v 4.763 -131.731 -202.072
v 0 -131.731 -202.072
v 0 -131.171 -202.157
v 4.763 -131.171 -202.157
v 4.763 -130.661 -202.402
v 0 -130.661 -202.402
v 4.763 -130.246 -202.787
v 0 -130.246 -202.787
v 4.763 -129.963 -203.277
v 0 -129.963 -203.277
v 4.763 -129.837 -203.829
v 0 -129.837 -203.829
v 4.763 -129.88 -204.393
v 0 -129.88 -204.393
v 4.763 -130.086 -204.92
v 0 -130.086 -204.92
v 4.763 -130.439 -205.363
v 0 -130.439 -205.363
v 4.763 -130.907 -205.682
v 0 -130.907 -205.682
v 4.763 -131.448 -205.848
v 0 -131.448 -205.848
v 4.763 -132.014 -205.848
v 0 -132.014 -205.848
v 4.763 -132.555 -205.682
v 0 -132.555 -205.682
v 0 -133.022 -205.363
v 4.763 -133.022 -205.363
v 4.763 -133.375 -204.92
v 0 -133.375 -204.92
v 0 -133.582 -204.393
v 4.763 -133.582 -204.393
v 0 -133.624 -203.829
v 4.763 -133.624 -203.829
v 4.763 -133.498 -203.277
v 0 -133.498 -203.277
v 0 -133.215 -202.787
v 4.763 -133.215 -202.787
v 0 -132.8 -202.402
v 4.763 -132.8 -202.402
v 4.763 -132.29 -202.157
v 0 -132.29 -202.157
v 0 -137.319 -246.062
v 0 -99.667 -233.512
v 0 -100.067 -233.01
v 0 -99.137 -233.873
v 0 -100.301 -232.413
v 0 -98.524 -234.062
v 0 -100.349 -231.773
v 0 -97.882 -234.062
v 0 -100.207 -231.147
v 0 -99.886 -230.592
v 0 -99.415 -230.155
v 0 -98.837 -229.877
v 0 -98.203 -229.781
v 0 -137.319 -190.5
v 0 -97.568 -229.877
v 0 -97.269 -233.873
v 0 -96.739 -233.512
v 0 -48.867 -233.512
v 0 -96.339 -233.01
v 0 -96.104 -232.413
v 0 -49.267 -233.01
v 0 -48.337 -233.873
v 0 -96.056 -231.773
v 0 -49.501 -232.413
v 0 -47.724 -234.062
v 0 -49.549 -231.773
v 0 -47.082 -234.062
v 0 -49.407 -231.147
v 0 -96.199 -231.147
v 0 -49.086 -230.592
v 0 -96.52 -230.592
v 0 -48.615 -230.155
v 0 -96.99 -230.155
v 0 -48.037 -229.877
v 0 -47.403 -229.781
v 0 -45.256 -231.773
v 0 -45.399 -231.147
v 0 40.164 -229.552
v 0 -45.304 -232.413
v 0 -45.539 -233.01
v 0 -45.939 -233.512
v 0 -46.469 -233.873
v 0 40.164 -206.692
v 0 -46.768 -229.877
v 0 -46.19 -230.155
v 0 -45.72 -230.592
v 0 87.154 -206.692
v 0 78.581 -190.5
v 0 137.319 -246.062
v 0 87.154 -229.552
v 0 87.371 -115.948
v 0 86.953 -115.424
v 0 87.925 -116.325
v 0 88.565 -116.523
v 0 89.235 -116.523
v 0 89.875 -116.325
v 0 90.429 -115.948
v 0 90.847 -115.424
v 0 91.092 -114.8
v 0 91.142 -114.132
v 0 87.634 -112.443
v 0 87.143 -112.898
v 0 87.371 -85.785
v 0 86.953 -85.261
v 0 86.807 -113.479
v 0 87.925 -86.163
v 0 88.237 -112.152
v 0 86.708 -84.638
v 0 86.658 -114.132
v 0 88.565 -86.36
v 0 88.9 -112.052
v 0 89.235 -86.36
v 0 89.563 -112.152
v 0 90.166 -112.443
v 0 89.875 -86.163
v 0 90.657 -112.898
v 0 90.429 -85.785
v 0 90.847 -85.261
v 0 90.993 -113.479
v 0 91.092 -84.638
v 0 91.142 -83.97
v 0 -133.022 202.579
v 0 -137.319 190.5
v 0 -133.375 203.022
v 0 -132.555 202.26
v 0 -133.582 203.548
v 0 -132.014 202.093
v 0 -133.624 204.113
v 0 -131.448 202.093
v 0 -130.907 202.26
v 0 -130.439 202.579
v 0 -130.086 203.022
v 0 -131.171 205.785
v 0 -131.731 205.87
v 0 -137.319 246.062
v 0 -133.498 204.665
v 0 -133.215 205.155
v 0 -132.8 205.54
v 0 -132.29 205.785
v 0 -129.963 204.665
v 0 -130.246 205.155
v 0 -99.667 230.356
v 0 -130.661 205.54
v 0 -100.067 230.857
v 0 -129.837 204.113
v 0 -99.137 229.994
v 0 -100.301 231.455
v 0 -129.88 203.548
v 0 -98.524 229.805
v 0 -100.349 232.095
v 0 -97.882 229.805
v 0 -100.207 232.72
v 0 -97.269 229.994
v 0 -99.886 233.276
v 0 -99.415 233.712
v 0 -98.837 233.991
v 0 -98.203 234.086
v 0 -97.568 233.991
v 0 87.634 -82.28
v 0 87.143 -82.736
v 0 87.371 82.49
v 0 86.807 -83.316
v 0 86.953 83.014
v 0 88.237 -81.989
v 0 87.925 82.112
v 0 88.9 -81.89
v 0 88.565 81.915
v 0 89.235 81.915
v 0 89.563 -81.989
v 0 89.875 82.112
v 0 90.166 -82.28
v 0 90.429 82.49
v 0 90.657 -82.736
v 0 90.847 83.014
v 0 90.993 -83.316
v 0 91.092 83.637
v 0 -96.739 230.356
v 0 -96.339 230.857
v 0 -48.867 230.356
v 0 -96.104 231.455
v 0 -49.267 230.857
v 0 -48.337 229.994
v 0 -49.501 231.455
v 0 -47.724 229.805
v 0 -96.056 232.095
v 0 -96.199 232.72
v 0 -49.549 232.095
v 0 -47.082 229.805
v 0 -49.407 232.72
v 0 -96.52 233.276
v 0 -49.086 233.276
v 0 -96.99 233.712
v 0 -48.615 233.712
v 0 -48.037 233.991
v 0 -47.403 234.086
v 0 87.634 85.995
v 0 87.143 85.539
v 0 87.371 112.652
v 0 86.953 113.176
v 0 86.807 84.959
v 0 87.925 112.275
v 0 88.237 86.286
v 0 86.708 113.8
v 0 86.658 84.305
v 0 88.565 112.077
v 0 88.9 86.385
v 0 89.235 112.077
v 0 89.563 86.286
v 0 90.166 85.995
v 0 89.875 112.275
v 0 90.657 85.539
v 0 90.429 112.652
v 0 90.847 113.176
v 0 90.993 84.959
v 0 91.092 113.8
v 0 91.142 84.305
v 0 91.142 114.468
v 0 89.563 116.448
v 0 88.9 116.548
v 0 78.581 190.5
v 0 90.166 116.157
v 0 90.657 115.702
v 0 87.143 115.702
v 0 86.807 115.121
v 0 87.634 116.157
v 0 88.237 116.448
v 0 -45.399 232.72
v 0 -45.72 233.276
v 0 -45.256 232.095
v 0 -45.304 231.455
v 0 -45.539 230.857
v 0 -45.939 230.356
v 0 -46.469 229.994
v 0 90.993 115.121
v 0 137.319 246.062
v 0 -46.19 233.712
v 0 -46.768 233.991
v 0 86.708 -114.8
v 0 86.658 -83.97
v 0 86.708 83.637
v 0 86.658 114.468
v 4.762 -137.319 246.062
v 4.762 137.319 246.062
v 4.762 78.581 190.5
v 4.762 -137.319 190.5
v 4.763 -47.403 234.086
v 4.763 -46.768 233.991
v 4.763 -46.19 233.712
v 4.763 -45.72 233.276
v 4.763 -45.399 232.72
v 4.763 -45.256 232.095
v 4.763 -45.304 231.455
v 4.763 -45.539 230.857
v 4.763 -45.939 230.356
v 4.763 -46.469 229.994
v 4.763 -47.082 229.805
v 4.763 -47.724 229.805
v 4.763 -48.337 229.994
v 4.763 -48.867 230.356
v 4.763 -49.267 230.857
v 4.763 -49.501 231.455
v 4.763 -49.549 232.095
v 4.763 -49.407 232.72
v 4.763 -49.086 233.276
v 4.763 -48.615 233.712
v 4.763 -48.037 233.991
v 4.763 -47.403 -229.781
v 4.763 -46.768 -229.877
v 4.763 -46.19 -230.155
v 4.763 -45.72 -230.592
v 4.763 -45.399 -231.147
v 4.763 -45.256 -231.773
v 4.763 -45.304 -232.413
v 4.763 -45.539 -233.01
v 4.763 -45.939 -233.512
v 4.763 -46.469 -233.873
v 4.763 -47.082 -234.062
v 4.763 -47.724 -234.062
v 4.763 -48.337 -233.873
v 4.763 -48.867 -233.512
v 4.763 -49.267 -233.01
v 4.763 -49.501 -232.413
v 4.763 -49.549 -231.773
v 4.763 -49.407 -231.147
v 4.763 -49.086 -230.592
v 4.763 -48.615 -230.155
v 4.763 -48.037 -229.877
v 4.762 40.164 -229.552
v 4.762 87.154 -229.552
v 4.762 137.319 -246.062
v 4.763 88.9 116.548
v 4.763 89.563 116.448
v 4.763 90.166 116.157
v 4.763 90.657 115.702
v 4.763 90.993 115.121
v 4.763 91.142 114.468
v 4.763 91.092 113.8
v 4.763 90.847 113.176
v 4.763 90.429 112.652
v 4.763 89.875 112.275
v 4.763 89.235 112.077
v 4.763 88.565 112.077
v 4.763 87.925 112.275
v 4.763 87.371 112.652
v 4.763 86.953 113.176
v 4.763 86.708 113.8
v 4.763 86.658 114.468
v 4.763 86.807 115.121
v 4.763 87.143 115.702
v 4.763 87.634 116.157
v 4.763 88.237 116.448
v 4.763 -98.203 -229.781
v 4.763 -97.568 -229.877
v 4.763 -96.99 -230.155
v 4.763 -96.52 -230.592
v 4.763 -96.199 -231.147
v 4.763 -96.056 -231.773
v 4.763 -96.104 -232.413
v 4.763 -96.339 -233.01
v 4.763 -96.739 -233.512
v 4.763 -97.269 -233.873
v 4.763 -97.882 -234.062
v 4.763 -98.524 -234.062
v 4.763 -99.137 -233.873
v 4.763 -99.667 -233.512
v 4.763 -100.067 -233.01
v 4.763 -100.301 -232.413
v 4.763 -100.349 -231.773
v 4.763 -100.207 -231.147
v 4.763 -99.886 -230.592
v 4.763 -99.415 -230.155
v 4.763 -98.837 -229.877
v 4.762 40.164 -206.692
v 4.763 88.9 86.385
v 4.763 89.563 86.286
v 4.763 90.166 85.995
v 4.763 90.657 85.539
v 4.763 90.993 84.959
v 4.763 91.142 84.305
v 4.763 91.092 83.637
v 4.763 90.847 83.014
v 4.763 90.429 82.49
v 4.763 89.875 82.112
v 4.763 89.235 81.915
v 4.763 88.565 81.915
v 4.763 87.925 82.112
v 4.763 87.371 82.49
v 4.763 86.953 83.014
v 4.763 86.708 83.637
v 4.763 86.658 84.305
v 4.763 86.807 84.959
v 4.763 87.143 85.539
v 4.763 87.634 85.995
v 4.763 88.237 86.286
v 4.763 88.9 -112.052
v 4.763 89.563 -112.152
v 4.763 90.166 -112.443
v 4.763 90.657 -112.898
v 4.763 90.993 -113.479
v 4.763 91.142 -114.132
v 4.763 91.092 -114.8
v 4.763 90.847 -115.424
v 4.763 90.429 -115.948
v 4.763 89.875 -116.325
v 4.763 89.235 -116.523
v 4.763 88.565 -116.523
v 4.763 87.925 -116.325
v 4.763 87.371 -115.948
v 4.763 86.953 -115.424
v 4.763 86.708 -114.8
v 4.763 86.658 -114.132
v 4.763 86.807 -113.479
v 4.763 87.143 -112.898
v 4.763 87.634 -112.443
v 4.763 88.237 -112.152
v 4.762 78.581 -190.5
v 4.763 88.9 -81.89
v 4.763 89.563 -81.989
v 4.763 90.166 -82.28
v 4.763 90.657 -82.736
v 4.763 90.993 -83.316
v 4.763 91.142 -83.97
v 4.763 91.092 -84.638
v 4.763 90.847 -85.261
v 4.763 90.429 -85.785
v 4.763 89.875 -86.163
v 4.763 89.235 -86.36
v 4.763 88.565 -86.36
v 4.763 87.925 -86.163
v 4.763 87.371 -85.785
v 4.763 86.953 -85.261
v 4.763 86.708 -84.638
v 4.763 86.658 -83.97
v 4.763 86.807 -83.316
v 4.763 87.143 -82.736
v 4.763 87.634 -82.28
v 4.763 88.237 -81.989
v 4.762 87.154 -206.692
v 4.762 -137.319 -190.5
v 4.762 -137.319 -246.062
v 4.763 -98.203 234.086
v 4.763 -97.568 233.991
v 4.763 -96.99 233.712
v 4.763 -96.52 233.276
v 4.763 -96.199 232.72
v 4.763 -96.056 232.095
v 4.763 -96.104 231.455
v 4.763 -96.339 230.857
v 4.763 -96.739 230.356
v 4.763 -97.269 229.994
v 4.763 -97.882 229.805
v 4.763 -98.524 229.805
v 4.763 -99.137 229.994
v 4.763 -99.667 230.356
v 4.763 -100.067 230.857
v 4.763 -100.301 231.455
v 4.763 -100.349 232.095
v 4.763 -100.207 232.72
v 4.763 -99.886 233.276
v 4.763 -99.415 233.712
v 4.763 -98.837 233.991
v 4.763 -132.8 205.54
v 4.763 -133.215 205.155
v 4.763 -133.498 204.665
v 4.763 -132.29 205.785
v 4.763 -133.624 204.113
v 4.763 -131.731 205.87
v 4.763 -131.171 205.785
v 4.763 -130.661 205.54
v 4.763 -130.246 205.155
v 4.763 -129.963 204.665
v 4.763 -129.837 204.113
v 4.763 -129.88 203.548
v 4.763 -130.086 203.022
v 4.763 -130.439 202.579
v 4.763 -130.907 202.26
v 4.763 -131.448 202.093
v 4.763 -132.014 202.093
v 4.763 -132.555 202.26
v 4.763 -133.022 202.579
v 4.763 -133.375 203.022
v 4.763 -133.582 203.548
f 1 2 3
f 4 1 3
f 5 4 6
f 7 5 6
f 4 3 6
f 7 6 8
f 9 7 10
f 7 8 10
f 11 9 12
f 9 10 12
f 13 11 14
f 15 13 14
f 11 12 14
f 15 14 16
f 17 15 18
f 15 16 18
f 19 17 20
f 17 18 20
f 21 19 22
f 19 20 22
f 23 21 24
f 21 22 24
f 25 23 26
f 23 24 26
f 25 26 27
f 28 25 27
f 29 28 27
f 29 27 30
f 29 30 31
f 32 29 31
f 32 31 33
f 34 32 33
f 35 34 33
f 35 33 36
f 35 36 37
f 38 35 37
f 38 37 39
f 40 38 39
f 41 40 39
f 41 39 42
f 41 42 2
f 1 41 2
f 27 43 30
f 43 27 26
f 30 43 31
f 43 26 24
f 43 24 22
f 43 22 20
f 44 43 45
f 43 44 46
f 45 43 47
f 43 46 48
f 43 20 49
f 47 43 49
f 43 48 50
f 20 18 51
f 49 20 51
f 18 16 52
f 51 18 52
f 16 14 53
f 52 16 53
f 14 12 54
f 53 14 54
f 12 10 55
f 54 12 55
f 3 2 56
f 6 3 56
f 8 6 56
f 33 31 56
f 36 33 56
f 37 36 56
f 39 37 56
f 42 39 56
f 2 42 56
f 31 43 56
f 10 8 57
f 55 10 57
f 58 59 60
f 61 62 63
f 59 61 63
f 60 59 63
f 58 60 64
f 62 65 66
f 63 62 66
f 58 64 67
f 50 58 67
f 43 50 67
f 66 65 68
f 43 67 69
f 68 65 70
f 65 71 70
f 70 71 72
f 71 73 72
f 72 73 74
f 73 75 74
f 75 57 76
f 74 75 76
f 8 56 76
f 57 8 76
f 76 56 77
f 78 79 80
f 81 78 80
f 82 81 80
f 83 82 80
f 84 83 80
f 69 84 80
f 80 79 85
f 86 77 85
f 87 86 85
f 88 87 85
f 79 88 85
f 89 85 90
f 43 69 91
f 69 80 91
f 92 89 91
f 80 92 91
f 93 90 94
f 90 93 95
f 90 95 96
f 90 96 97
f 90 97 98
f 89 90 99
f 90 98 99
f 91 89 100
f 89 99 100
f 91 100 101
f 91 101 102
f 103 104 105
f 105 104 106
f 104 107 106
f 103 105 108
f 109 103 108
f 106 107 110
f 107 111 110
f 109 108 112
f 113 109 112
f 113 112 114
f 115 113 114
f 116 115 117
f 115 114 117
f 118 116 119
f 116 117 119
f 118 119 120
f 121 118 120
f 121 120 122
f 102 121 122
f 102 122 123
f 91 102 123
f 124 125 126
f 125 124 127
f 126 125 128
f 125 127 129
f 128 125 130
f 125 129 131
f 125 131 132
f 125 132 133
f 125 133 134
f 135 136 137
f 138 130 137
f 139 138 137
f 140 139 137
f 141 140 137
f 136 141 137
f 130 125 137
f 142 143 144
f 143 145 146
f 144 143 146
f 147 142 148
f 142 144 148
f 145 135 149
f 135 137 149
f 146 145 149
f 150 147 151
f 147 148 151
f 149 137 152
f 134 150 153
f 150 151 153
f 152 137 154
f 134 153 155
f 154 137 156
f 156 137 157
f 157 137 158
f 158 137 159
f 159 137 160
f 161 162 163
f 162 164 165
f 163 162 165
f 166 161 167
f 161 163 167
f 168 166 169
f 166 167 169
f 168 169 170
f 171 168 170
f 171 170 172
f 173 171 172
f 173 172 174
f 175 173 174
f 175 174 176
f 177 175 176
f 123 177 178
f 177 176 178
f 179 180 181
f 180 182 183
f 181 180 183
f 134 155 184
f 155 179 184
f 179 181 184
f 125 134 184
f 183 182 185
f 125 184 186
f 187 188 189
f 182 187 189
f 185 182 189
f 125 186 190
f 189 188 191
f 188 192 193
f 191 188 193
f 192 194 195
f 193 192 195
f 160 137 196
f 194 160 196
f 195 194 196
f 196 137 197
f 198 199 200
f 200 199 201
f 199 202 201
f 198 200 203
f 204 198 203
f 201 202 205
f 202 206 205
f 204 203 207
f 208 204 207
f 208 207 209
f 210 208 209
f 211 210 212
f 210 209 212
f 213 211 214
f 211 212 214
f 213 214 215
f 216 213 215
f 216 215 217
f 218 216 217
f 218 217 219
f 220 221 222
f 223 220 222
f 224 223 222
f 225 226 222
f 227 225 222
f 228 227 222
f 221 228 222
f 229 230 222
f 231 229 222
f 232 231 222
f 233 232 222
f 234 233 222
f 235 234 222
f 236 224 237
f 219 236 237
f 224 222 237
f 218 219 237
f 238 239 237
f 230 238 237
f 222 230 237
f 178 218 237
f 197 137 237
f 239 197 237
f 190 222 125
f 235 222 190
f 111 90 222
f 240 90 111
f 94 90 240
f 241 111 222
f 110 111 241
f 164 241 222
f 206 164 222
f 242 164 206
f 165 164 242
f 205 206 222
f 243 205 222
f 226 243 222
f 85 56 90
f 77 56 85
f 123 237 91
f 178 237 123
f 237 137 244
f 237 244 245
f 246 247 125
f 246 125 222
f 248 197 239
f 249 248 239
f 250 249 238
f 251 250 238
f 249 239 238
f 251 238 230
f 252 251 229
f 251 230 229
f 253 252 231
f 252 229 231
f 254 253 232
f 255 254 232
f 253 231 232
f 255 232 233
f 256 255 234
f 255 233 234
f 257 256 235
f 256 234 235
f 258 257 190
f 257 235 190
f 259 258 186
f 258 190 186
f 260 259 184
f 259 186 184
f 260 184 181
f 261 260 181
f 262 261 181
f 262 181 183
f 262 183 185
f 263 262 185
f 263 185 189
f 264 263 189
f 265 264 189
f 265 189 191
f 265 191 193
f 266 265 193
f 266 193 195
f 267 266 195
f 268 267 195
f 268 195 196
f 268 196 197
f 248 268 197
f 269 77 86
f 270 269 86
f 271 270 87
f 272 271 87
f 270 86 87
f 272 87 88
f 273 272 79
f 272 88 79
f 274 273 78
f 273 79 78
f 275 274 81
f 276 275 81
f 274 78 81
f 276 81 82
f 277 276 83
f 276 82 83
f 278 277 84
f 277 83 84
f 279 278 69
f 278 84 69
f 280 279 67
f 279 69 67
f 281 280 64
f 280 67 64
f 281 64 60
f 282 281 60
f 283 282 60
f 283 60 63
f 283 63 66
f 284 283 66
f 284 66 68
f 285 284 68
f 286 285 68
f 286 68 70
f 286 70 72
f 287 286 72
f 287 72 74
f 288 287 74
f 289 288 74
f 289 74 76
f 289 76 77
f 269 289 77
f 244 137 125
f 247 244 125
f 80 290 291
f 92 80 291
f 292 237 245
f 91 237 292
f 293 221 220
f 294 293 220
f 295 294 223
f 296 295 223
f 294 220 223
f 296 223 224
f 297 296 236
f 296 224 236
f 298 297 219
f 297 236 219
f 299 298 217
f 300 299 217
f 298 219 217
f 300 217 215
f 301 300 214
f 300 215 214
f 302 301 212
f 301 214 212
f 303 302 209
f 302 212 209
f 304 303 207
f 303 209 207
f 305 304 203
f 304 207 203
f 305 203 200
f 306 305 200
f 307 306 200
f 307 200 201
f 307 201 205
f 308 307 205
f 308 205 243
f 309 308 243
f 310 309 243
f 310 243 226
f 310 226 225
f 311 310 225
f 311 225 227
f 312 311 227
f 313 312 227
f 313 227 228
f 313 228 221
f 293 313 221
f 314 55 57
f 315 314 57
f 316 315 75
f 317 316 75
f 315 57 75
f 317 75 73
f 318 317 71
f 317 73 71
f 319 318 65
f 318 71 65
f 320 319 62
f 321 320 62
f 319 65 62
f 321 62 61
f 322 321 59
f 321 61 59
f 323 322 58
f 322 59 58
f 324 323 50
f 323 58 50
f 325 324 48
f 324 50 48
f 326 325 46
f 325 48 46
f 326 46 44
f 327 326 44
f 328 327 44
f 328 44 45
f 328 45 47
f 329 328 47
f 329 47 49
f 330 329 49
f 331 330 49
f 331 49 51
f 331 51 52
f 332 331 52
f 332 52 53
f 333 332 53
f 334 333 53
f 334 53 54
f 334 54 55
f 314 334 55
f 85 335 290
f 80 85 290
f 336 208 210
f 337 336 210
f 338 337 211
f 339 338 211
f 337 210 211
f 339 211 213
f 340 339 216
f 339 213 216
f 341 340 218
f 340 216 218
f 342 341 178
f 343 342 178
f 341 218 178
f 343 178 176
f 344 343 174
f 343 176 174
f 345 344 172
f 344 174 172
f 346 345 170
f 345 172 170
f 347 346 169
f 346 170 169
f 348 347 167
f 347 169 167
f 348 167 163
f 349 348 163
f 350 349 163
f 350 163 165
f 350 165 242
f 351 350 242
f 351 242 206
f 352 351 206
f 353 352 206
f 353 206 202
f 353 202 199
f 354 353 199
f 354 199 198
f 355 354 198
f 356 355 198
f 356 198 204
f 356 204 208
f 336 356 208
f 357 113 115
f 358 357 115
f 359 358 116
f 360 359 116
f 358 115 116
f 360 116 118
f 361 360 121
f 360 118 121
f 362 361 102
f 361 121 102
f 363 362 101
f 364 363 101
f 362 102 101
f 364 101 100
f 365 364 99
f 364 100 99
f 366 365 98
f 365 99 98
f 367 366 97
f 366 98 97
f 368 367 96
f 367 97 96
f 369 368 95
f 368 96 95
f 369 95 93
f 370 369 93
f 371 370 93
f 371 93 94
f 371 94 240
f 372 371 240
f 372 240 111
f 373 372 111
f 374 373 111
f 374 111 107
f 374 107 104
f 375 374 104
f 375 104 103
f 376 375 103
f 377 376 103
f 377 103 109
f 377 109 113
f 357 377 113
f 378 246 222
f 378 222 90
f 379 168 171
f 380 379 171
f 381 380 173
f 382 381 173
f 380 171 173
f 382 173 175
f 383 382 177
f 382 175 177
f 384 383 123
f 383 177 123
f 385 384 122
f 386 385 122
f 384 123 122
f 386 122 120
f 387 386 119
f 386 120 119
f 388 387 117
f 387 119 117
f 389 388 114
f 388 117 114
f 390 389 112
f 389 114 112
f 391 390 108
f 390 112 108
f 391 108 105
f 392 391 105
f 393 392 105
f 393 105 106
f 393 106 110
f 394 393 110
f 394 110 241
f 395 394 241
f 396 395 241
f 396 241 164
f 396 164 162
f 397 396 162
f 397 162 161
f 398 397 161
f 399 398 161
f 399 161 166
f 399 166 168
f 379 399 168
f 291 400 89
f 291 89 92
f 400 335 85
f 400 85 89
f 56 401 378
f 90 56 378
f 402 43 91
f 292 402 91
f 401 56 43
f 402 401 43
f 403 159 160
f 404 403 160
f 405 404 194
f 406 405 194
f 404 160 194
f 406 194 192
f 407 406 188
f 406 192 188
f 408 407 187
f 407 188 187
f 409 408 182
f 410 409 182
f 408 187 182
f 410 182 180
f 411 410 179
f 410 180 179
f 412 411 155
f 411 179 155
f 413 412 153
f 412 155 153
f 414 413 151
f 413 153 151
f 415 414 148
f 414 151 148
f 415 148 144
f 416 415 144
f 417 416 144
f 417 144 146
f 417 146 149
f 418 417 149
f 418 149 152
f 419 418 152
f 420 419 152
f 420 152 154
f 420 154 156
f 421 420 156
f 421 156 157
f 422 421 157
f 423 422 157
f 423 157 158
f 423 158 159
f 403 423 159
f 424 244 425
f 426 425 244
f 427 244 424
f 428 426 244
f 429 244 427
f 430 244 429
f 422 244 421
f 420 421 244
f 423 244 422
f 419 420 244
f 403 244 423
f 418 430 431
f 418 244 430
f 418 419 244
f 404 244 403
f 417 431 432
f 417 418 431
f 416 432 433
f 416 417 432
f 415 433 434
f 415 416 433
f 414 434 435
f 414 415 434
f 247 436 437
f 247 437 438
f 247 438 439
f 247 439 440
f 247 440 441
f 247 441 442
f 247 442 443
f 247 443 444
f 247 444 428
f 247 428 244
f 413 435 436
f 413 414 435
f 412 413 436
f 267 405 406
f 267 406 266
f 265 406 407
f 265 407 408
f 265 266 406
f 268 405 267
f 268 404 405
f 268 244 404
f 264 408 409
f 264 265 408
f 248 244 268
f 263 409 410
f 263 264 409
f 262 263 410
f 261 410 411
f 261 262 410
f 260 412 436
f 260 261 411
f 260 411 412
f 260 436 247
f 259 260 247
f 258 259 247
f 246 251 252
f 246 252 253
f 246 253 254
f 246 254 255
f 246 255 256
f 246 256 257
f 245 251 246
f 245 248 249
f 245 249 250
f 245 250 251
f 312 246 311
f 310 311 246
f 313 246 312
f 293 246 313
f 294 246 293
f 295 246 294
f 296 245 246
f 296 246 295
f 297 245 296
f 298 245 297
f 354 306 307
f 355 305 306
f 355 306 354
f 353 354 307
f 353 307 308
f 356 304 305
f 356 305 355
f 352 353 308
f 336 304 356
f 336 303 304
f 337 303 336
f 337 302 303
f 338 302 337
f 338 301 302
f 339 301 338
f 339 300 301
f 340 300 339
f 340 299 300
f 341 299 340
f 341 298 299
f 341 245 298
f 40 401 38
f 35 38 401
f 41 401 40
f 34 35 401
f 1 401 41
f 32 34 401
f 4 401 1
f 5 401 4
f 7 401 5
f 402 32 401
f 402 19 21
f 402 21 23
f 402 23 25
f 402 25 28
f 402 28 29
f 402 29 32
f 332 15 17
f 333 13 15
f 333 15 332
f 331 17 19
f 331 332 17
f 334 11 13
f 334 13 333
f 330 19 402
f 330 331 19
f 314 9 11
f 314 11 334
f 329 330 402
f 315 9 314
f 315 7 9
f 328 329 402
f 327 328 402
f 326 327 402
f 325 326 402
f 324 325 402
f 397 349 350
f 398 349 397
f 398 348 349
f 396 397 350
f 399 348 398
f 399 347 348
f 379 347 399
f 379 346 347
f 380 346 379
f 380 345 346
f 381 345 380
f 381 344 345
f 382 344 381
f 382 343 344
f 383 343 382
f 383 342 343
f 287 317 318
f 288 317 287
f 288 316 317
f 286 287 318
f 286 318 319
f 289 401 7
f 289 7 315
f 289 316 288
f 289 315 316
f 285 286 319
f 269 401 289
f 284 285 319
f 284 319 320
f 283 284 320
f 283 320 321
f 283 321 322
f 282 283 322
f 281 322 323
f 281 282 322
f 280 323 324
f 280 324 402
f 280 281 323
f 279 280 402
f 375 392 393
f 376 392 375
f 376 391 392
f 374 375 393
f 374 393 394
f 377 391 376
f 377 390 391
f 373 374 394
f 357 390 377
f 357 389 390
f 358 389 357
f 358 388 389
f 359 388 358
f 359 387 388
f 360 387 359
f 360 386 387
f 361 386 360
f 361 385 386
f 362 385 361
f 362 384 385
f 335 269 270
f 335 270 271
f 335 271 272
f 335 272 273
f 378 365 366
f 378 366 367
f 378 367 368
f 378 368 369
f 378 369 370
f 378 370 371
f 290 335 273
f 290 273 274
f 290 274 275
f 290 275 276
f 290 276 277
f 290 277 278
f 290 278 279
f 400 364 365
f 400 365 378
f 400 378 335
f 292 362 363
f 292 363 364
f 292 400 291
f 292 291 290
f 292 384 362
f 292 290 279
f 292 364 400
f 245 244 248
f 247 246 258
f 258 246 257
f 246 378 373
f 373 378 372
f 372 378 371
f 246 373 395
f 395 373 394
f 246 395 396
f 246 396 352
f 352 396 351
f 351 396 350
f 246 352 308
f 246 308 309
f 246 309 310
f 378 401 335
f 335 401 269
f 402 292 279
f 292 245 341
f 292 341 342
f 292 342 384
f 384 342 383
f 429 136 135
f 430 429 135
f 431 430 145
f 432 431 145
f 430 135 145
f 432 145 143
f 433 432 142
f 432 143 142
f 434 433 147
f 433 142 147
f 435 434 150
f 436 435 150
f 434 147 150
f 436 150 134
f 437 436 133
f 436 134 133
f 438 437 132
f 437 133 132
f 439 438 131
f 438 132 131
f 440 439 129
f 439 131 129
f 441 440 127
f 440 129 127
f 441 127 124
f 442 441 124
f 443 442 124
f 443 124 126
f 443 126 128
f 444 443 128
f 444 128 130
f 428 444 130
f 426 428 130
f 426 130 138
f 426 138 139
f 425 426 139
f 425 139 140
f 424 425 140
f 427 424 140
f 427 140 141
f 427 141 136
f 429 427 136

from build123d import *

# Parameters (mm, degrees)
SKETCH1_W                 = 492.125
SKETCH1_H                 = 274.6375
BOSS_EXTRUDE1_DEPTH       = 4.7625
CUT_EXTRUDE1_REACH        = 6.763
BOSS_EXTRUDE2_REACH       = 494.125
SKETCH3_W                 = 4.7625
SKETCH3_H                 = 274.6375
F_8_CLEARANCE_HOLE1_D     = 4.3053
F_8_CLEARANCE_HOLE1_DEPTH = 74.422
F_8_CLEARANCE_HOLE1_TIP   = 1.293442612
SKETCH9_W                 = 381
SKETCH9_H                 = 215.9
CUT_EXTRUDE2_DEPTH        = 5.7625
F_8_CLEARANCE_HOLE2_D     = 4.4958
F_8_CLEARANCE_HOLE2_DEPTH = 74.422
F_8_CLEARANCE_HOLE2_TIP   = 1.350674586
F_6_CLEARANCE_HOLE1_D     = 3.7973
F_6_CLEARANCE_HOLE1_DEPTH = 74.422
F_6_CLEARANCE_HOLE1_TIP   = 1.140824014
SKETCH14_W                = 22.86
SKETCH14_H                = 46.99
CUT_EXTRUDE3_DEPTH        = 46.736


with BuildPart() as part:
    # Sketch1 → Boss-Extrude1 (new body)
    with BuildSketch(Plane(origin=(0, 0, 0), x_dir=(0, 0, -1), z_dir=(1, 0, 0))):
        Rectangle(SKETCH1_W, SKETCH1_H)
    extrude(amount=BOSS_EXTRUDE1_DEPTH)

    # Sketch2 → Cut-Extrude1 (cut, up to next)
    with BuildSketch(Plane(origin=(4.7625, 0, 0), x_dir=(0, 0, -1), z_dir=(1, 0, 0)), mode=Mode.PRIVATE) as cut_extrude1_sk1:
        Polygon((-24.852813742, -60), (24.852813742, -60), (42.426406871, -42.426406871), (60, -24.852813742), (60, 24.852813742), (24.852813742, 60), (-24.852813742, 60), (-60, 24.852813742), (-60, -24.852813742), align=None)
    cut_extrude1_tool1 = extrude(cut_extrude1_sk1.sketch, amount=-CUT_EXTRUDE1_REACH, mode=Mode.PRIVATE) & part.part
    add(cut_extrude1_tool1.solids().sort_by_distance((4.7625, 0, 0))[0], mode=Mode.SUBTRACT)

    # Sketch3 → Boss-Extrude2 (add, up to next)
    with BuildSketch(Plane.XY.offset(246.0625), mode=Mode.PRIVATE) as boss_extrude2_sk1:
        with Locations((2.38125, 0)):
            Rectangle(SKETCH3_W, SKETCH3_H)
    boss_extrude2_tool1 = extrude(boss_extrude2_sk1.sketch, amount=-BOSS_EXTRUDE2_REACH, mode=Mode.PRIVATE) - part.part
    add(boss_extrude2_tool1.solids().sort_by_distance((2.38125, 0, 246.0625))[0])

    # #8 Clearance Hole1
    with Locations(Plane(origin=(4.7625, 0, 0), x_dir=(0, 0, -1), z_dir=(1, 0, 0))):
        with Locations((-231.93375, -98.20275), (-231.93375, -47.40275), (231.93375, -47.40275), (231.93375, -98.20275)):
            Hole(F_8_CLEARANCE_HOLE1_D / 2, depth=F_8_CLEARANCE_HOLE1_DEPTH)
            with Locations((0, 0, -(F_8_CLEARANCE_HOLE1_DEPTH + F_8_CLEARANCE_HOLE1_TIP / 2))):  # 118° drill point
                Cone(0, F_8_CLEARANCE_HOLE1_D / 2, F_8_CLEARANCE_HOLE1_TIP, mode=Mode.SUBTRACT)

    # Sketch9 → Cut-Extrude2 (cut, through all)
    with BuildSketch(Plane(origin=(4.7625, 0, 0), x_dir=(0, 0, -1), z_dir=(1, 0, 0))):
        with Locations((0, -29.36875)):
            Rectangle(SKETCH9_W, SKETCH9_H)
    extrude(amount=-CUT_EXTRUDE2_DEPTH, mode=Mode.SUBTRACT)

    # #8 Clearance Hole2
    with Locations(Plane(origin=(4.7625, 0, 0), x_dir=(0, 0, -1), z_dir=(1, 0, 0))):
        with Locations((-114.3, 88.9), (-84.1375, 88.9), (84.1375, 88.9), (114.3, 88.9)):
            Hole(F_8_CLEARANCE_HOLE2_D / 2, depth=F_8_CLEARANCE_HOLE2_DEPTH)
            with Locations((0, 0, -(F_8_CLEARANCE_HOLE2_DEPTH + F_8_CLEARANCE_HOLE2_TIP / 2))):  # 118° drill point
                Cone(0, F_8_CLEARANCE_HOLE2_D / 2, F_8_CLEARANCE_HOLE2_TIP, mode=Mode.SUBTRACT)

    # #6 Clearance Hole1
    with Locations(Plane(origin=(4.7625, 0, 0), x_dir=(0, 0, -1), z_dir=(1, 0, 0))):
        with Locations((-203.97089, -131.73075), (203.97089, -131.73075)):
            Hole(F_6_CLEARANCE_HOLE1_D / 2, depth=F_6_CLEARANCE_HOLE1_DEPTH)
            with Locations((0, 0, -(F_6_CLEARANCE_HOLE1_DEPTH + F_6_CLEARANCE_HOLE1_TIP / 2))):  # 118° drill point
                Cone(0, F_6_CLEARANCE_HOLE1_D / 2, F_6_CLEARANCE_HOLE1_TIP, mode=Mode.SUBTRACT)

    # Sketch14 → Cut-Extrude3 (cut)
    with BuildSketch(Plane(origin=(4.7625, 0, 0), x_dir=(0, 0, -1), z_dir=(1, 0, 0))):
        with Locations((218.1225, 63.65875)):
            Rectangle(SKETCH14_W, SKETCH14_H)
    extrude(amount=-CUT_EXTRUDE3_DEPTH, mode=Mode.SUBTRACT)


solid = part.part
